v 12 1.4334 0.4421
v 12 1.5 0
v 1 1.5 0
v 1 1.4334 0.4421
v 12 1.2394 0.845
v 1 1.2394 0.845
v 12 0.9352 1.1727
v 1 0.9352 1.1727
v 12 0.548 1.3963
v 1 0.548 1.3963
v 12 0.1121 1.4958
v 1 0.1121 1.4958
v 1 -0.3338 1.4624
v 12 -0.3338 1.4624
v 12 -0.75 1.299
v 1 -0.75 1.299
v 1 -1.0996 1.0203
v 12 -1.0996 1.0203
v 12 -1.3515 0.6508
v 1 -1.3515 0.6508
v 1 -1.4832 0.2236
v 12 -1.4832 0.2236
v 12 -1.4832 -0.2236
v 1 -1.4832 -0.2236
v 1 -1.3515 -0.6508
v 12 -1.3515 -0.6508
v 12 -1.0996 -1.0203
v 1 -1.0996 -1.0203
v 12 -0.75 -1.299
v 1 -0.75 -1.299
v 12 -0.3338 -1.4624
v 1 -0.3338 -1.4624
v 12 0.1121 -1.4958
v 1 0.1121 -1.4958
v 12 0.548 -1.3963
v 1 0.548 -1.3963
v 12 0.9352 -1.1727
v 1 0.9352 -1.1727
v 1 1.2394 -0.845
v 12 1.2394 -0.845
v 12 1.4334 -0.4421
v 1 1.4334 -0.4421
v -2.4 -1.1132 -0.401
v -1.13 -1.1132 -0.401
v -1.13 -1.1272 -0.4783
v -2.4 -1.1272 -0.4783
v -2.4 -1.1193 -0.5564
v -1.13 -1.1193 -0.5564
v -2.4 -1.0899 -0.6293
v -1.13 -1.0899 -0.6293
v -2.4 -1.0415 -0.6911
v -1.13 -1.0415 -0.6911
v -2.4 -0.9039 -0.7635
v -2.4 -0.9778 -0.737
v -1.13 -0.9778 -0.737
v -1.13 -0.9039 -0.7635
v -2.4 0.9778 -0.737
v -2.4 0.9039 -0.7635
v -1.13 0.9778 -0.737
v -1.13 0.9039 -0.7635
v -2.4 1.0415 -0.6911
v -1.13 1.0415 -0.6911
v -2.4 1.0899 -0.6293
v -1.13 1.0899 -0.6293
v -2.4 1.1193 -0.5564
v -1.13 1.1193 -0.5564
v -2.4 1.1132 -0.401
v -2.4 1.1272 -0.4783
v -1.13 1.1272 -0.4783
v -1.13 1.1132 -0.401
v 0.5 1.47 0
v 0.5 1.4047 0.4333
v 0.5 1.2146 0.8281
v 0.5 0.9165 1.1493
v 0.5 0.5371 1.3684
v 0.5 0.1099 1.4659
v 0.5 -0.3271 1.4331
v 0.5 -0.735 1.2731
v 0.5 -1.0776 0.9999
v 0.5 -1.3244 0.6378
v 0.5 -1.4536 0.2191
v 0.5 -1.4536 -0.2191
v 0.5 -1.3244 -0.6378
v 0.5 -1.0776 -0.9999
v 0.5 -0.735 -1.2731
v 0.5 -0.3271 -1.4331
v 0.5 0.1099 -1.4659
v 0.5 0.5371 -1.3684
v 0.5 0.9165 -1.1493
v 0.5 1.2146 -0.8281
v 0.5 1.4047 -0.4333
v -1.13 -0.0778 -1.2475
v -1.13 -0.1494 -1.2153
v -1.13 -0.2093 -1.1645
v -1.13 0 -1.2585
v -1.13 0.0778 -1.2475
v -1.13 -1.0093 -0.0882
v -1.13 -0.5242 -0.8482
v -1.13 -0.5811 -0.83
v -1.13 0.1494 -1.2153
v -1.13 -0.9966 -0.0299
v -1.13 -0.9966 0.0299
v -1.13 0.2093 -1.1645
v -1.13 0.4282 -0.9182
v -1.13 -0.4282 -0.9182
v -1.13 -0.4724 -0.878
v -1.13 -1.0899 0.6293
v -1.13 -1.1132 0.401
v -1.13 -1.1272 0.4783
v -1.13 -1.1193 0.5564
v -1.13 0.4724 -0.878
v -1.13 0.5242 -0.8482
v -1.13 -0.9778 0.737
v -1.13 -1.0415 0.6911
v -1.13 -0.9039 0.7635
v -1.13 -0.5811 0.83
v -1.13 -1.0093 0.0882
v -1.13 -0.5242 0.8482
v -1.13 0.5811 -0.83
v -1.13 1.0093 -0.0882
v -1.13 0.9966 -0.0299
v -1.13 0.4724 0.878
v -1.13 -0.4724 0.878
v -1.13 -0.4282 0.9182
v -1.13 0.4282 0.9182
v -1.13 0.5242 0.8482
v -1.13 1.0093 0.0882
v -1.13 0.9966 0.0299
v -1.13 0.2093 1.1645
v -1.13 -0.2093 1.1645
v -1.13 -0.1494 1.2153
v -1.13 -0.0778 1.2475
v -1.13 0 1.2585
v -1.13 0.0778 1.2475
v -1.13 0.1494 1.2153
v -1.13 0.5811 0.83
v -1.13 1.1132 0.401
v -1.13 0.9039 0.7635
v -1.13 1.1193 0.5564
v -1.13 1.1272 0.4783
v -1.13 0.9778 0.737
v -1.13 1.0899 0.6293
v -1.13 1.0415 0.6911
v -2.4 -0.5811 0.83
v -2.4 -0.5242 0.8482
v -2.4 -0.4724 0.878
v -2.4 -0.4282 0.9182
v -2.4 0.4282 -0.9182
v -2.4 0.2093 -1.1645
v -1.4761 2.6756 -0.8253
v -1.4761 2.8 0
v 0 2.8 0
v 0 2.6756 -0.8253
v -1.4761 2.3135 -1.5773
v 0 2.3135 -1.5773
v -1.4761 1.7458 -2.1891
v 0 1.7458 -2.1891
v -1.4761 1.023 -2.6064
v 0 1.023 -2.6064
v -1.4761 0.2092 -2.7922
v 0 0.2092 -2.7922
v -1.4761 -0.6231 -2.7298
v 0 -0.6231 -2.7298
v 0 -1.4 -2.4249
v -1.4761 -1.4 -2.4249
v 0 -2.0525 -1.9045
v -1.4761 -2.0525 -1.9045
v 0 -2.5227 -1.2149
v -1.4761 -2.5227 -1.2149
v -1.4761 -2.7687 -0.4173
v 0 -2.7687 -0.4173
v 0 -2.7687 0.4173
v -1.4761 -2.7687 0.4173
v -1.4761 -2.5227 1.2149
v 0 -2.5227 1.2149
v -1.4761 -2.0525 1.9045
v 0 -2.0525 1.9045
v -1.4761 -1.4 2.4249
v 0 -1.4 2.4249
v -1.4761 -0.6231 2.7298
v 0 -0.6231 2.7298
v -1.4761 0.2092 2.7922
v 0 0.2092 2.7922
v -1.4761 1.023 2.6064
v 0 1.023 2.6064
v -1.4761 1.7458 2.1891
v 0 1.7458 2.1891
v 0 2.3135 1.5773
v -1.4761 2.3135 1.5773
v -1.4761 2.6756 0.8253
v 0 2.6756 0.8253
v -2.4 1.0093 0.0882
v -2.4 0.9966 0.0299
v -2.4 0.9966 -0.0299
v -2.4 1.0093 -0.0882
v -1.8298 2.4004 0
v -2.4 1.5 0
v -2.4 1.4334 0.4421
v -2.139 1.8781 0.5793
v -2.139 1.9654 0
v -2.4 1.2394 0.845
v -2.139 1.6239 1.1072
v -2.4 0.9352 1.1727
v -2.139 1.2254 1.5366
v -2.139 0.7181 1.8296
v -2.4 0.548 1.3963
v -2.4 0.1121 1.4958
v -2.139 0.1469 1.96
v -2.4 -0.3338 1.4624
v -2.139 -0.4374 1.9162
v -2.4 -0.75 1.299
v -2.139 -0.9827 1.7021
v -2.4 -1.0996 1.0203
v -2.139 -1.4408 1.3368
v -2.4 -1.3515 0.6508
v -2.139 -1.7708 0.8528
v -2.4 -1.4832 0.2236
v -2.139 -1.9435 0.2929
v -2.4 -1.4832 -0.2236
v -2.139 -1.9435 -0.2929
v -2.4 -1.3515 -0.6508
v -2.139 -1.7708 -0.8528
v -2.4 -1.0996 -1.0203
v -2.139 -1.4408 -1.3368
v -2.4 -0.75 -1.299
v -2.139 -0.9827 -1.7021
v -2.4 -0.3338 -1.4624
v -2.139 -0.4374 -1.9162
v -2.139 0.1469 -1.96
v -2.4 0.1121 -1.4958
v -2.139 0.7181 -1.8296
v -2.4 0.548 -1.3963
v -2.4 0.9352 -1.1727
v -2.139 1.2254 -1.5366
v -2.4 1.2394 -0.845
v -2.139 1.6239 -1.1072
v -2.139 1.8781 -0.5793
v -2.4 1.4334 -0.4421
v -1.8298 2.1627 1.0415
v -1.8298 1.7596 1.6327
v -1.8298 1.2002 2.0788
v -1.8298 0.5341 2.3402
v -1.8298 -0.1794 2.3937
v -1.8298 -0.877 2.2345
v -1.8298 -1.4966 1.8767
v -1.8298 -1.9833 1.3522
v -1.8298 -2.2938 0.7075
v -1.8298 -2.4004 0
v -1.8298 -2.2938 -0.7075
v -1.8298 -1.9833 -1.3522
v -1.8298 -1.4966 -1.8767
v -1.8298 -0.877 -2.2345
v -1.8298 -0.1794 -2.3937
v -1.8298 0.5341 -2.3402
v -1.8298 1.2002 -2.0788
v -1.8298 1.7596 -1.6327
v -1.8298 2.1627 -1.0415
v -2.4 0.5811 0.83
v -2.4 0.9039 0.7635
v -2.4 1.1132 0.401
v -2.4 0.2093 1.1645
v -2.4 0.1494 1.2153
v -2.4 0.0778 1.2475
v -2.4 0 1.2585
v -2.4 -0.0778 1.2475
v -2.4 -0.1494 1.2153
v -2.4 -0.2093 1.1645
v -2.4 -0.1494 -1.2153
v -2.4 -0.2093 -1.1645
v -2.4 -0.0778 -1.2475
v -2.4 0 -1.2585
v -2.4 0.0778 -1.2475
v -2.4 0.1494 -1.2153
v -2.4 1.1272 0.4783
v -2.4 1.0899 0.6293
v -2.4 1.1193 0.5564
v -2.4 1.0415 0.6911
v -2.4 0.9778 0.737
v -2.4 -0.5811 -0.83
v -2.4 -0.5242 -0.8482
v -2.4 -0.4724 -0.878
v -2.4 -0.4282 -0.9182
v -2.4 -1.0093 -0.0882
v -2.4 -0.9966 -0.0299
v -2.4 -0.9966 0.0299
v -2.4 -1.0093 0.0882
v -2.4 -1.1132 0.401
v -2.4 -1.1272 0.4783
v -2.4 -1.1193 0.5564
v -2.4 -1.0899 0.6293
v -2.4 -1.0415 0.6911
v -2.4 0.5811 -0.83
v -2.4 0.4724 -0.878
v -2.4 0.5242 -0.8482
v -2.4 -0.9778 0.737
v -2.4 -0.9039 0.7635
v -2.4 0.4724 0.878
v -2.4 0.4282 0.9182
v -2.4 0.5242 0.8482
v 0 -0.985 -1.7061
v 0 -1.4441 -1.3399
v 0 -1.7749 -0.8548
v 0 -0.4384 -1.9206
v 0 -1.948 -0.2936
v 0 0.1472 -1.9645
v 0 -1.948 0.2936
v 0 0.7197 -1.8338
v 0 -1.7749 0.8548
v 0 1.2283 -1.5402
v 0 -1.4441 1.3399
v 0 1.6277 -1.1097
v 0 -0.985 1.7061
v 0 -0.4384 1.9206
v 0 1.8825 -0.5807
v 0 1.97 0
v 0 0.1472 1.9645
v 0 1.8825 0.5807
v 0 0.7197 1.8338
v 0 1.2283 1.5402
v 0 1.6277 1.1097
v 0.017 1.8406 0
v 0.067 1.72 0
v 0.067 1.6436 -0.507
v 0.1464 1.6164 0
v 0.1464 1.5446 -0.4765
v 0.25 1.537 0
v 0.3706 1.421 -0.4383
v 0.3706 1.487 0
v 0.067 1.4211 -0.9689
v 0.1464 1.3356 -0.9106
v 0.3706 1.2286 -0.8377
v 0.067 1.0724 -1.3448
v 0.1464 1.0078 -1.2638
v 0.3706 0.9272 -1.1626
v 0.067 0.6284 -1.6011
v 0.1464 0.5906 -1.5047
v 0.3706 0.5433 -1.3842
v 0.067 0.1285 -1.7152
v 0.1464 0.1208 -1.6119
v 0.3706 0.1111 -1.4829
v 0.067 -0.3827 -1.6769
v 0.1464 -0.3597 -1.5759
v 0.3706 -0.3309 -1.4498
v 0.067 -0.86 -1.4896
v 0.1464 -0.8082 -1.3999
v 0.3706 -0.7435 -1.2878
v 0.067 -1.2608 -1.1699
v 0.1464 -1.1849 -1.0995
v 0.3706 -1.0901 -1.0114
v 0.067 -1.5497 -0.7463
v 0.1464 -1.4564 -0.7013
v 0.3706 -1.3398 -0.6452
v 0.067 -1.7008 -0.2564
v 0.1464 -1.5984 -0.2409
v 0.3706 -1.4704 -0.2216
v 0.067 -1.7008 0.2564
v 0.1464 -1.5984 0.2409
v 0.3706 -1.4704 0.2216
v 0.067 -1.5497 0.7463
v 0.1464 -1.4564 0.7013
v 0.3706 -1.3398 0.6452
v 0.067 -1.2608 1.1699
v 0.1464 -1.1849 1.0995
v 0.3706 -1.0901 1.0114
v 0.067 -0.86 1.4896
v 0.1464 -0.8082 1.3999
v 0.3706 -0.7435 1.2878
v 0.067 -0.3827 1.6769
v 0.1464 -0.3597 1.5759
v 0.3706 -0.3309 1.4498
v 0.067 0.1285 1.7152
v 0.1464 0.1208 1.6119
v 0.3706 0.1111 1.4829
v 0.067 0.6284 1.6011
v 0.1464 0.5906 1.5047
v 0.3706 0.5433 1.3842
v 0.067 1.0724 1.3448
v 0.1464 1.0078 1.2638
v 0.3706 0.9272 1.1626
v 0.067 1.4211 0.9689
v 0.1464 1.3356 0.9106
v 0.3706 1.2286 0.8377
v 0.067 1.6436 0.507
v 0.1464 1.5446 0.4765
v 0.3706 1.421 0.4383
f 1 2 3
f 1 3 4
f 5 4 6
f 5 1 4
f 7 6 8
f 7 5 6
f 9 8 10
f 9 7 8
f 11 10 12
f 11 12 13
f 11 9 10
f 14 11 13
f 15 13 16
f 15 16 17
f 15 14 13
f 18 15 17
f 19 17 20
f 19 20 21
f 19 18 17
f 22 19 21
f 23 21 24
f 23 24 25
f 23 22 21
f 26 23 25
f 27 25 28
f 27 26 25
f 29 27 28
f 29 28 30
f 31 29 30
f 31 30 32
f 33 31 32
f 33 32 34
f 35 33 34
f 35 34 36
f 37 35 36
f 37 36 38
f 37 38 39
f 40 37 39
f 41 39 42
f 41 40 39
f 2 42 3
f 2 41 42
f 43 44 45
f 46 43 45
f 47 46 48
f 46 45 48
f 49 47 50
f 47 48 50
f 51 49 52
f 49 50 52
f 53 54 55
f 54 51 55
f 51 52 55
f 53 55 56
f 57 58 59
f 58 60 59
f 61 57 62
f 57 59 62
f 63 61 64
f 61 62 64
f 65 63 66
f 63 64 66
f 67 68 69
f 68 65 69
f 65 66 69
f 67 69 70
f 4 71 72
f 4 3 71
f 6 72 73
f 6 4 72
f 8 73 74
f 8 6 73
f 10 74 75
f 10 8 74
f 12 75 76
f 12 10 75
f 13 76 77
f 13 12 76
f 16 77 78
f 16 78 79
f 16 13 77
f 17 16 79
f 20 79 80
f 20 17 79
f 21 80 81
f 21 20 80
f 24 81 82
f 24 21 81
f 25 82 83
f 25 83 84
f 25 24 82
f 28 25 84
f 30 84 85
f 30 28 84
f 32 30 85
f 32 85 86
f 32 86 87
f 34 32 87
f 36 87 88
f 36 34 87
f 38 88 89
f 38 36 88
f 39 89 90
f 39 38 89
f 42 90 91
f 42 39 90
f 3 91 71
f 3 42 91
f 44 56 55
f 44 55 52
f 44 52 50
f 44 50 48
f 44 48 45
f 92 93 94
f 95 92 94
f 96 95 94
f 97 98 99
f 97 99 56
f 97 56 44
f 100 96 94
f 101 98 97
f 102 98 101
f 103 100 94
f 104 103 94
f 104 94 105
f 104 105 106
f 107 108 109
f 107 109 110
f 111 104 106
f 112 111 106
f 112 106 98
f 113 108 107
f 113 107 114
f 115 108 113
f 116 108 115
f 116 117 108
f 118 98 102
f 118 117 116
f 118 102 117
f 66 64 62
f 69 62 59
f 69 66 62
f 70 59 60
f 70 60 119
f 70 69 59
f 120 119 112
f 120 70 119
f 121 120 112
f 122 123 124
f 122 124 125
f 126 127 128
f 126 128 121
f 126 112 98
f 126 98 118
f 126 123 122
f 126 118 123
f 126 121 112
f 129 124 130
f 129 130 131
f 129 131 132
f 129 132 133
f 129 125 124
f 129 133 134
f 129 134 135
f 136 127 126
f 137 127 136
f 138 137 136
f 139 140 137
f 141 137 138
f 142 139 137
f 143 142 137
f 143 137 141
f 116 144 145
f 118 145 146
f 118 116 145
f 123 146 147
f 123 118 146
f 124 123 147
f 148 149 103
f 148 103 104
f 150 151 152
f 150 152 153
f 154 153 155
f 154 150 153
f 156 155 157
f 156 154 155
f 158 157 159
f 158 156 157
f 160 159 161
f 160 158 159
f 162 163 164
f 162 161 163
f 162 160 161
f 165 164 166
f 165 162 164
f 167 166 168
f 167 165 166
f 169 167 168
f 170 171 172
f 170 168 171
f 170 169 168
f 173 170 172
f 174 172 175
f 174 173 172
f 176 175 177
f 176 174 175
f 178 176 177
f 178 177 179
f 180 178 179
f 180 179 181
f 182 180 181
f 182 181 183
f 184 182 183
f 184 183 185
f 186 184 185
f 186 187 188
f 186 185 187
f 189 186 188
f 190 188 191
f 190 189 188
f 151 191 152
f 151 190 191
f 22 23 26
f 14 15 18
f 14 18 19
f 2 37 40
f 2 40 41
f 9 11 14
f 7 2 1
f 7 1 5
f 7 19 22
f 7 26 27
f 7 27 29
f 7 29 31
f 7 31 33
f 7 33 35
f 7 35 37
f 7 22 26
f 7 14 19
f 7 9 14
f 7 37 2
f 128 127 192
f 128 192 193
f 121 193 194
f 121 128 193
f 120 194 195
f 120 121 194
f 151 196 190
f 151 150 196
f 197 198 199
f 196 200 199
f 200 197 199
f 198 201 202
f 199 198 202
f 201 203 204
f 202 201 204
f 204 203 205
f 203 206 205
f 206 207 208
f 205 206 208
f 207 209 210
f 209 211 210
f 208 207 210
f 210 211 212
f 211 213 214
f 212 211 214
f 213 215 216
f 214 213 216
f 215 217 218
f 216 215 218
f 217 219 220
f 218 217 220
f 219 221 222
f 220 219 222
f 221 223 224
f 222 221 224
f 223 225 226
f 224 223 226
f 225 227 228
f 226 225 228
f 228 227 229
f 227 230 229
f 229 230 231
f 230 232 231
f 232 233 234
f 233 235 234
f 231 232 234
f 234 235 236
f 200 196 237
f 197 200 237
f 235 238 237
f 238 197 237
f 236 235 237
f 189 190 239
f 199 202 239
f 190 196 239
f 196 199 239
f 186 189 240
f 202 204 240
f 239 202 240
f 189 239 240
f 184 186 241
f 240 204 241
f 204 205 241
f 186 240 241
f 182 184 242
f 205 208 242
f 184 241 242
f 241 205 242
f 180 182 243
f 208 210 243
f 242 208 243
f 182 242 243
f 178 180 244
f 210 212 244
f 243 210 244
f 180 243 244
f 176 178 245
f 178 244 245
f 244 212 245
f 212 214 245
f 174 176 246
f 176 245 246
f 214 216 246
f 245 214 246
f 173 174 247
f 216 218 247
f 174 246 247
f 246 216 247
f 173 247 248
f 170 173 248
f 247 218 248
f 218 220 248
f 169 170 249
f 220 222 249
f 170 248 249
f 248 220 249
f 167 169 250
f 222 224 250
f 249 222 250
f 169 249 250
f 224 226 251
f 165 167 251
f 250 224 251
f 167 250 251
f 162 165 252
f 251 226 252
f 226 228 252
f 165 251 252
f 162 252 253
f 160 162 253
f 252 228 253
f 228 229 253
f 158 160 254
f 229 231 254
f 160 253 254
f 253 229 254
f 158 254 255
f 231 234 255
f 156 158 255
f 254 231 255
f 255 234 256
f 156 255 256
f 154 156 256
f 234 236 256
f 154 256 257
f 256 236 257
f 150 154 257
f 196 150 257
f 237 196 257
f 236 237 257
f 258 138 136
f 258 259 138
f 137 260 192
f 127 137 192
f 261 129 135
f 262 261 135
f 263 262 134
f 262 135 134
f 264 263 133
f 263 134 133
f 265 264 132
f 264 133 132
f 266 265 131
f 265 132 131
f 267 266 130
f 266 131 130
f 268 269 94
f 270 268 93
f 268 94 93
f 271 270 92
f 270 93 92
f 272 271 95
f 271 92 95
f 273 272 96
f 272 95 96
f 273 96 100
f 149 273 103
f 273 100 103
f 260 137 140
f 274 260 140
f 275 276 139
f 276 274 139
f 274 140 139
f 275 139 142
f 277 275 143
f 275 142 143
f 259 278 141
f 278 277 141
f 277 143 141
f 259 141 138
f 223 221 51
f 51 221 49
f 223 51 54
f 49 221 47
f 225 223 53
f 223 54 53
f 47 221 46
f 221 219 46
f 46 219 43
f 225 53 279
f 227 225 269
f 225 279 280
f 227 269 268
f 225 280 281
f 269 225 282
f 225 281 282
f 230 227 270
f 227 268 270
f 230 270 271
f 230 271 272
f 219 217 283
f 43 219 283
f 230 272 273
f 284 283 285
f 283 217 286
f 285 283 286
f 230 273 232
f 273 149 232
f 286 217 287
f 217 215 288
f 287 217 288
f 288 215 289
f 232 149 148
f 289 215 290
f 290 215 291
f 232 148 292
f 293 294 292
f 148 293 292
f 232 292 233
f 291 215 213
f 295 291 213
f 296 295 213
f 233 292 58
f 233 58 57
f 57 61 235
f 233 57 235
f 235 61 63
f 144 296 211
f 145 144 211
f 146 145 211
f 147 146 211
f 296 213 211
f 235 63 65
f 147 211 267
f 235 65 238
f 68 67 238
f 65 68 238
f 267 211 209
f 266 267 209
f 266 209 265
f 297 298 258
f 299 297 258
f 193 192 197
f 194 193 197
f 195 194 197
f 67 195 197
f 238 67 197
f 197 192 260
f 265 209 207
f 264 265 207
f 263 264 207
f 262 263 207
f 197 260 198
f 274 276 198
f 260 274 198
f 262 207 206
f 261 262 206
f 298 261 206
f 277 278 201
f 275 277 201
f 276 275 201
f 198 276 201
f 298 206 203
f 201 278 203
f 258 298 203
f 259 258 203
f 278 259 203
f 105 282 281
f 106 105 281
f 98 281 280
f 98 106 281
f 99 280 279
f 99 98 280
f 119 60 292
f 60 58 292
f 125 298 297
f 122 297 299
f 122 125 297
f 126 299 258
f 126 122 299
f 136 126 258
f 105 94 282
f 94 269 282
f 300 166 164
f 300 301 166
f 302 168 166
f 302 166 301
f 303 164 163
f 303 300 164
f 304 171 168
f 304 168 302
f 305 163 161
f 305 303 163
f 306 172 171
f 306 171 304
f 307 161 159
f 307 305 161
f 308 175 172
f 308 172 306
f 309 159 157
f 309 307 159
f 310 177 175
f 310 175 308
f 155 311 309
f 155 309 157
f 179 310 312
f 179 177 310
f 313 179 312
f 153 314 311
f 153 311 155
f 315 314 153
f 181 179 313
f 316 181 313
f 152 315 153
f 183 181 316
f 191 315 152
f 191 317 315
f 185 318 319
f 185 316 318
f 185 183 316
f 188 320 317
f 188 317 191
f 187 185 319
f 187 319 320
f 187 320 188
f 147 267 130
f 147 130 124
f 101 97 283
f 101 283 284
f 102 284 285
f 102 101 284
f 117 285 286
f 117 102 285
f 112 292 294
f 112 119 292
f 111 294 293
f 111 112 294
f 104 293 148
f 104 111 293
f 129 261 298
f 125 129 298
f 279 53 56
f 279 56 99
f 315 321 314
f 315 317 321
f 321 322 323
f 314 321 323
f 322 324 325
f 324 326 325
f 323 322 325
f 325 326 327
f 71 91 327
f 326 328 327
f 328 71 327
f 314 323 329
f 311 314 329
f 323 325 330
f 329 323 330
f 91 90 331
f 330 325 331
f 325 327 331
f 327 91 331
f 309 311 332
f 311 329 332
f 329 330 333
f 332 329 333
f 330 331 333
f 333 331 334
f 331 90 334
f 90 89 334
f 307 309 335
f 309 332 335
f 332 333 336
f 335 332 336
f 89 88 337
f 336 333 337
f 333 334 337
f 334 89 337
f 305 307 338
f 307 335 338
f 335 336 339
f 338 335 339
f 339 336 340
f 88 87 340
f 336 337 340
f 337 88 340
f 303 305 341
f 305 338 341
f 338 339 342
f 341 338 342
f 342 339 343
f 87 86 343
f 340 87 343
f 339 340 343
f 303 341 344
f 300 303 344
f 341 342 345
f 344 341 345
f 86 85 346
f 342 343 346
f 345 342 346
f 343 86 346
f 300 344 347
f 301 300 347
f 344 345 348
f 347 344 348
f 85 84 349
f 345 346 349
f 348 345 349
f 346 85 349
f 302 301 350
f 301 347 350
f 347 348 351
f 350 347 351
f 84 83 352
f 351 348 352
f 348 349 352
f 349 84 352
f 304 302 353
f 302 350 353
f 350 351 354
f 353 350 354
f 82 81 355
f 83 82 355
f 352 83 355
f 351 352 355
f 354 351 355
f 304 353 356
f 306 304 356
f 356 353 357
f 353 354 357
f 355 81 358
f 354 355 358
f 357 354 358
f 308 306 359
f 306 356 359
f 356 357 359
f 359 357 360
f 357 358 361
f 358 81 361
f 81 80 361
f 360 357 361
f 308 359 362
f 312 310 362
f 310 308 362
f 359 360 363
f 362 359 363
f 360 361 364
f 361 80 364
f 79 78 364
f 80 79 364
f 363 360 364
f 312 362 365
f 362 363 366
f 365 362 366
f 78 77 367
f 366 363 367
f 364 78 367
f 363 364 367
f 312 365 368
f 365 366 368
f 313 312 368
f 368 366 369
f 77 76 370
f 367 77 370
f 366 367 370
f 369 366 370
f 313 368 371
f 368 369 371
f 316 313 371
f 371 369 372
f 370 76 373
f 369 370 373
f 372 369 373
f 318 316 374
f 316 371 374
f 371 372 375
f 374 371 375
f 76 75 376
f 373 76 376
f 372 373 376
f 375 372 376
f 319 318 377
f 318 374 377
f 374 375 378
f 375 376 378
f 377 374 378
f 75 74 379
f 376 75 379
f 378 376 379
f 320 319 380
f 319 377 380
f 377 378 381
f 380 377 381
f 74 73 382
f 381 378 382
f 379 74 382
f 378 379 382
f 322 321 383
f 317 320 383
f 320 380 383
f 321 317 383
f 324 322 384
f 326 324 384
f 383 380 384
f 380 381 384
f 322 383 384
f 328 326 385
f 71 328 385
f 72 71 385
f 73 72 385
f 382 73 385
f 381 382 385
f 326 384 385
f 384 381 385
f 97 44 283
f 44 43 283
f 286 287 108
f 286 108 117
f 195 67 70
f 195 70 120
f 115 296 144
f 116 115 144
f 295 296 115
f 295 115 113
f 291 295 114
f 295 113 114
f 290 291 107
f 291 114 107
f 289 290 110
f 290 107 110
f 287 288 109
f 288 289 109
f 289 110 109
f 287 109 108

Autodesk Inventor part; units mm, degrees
ref_plane "YZ Plane" through (0, 0, 0) normal (1, 0, 0) x (0, 1, 0)
ref_plane "XZ Plane" through (0, 0, 0) normal (0, 1, 0) x (-1, 0, 0)
ref_plane "XY Plane" through (0, 0, 0) normal (0, 0, 1) x (1, 0, 0)
sketch "Sketch4" plane through (0, 0, 0) normal (0, 0, 1) x (1, 0, 0)
  line L0 (-2.4, 0) -> (12, 0)
  line L1 (0, 0) -> (-2.4, 0)
  line L2 (0, 2.8) -> (0, 1.97)
  line L3 (0.5, 1.47) -> (0.5, 1.47)
  line L4 (0.5, 1.47) -> (1, 1.5)
  arc A0 (0, 1.97) -> (0.5, 1.47) centre (0.5, 1.97) ccw
  line L5 (-2.4, 0) -> (-2.4, 1.5)
  line L6 (0, 2.8) -> (-1.4761, 2.8)
  arc A1 (-1.4761, 2.8) -> (-2.4, 1.5) centre (2.0854, -0.7093) ccw
  line L7 (1, 1.5) -> (12, 1.5)
  line L8 (12, 1.5) -> (12, 0)
  point P0 (0, 1.47)
  dimension "d71" = 0.5
  dimension "d72" = 12
  dimension "d74" = 0.5
  dimension "d75" = 2.94
  dimension "d78" = 3
  dimension "d82" = 5
  dimension "d83" = 2.4
  dimension "d84" = 5.6
  dimension "d104" = 11
  dimension "d105" = 3
revolve "Revolution7" add sketch "Sketch4" angle 360 about axis through (-2.4, 0, 0) along (1, 0, 0)
sketch "Sketch5" plane through (-2.4, 0, 0) normal (-1, 0, 0) x (0, 0, 1)
  circle A0 centre (0, 0) radius 1.4 construction
  circle A1 centre (0, 0) radius 0.98 construction
  line L0 (0, 0) -> (-0.8487, 0.49)
  line L1 (0, 0) -> (-0.8487, -0.49)
  line L2 (-1.8008, 0) -> (1.7887, 0)
  line L3 (-1.4, 0) -> (-0.8487, -0.49)
  line L4 (-1.4, 0) -> (-0.8487, 0.49)
  point P0 (0, 0)
  dimension "d88" = 2.8
  dimension "d89" = 1.96
  dimension "d90" = 30
  dimension "d91" = 30
extrude "Extrusion1" cut sketch "Sketch5" against normal blind 1.27
pattern_circular "Circular Pattern1" count 6 over 360 about axis through (-10, 0, 0) along (1, 0, 0) of "Extrusion1"
fillet "Fillet1" radius 0.28 12 edges at (-1.765, -1.2124, -0.7) (-1.765, -0.49, -0.8487) (-1.765, -0.98, 0) (-1.765, -1.2124, 0.7) (-1.765, -0.49, 0.8487) (-1.765, 0, 1.4) (-1.765, 0.98, 0) (-1.765, 1.2124, 0.7) (-1.765, 0.49, 0.8487) (-1.765, 0.49, -0.8487) (-1.765, 0, -1.4) (-1.765, 1.2124, -0.7)
thread "Thread7" size "M3x0.5" class "6g" standard "ISO Metric profile" length 11
equation "\"a\" = 1"
equation "\"b\" = 11"
equation "\"dk\" = 5.6"
equation "\"k\" = 2.4"
equation "\"r\" = 0.5"
equation "\"rf\" = 5"
equation "\"x\" = 0.5"
equation "\"A_\" = 2.8"
equation "\"t\" = 1.27"
equation "\"p\" = 0.5"
equation "\"l_\" = 12"
equation "\"d\" = 3"
equation "\"ds_\" = 2.94"
equation "\"lg\" = 0"
properties part number "Flachkopfschraube mit Innenrund ISO 14583 - M3 x 12 - 4.8" material "Stahl"
